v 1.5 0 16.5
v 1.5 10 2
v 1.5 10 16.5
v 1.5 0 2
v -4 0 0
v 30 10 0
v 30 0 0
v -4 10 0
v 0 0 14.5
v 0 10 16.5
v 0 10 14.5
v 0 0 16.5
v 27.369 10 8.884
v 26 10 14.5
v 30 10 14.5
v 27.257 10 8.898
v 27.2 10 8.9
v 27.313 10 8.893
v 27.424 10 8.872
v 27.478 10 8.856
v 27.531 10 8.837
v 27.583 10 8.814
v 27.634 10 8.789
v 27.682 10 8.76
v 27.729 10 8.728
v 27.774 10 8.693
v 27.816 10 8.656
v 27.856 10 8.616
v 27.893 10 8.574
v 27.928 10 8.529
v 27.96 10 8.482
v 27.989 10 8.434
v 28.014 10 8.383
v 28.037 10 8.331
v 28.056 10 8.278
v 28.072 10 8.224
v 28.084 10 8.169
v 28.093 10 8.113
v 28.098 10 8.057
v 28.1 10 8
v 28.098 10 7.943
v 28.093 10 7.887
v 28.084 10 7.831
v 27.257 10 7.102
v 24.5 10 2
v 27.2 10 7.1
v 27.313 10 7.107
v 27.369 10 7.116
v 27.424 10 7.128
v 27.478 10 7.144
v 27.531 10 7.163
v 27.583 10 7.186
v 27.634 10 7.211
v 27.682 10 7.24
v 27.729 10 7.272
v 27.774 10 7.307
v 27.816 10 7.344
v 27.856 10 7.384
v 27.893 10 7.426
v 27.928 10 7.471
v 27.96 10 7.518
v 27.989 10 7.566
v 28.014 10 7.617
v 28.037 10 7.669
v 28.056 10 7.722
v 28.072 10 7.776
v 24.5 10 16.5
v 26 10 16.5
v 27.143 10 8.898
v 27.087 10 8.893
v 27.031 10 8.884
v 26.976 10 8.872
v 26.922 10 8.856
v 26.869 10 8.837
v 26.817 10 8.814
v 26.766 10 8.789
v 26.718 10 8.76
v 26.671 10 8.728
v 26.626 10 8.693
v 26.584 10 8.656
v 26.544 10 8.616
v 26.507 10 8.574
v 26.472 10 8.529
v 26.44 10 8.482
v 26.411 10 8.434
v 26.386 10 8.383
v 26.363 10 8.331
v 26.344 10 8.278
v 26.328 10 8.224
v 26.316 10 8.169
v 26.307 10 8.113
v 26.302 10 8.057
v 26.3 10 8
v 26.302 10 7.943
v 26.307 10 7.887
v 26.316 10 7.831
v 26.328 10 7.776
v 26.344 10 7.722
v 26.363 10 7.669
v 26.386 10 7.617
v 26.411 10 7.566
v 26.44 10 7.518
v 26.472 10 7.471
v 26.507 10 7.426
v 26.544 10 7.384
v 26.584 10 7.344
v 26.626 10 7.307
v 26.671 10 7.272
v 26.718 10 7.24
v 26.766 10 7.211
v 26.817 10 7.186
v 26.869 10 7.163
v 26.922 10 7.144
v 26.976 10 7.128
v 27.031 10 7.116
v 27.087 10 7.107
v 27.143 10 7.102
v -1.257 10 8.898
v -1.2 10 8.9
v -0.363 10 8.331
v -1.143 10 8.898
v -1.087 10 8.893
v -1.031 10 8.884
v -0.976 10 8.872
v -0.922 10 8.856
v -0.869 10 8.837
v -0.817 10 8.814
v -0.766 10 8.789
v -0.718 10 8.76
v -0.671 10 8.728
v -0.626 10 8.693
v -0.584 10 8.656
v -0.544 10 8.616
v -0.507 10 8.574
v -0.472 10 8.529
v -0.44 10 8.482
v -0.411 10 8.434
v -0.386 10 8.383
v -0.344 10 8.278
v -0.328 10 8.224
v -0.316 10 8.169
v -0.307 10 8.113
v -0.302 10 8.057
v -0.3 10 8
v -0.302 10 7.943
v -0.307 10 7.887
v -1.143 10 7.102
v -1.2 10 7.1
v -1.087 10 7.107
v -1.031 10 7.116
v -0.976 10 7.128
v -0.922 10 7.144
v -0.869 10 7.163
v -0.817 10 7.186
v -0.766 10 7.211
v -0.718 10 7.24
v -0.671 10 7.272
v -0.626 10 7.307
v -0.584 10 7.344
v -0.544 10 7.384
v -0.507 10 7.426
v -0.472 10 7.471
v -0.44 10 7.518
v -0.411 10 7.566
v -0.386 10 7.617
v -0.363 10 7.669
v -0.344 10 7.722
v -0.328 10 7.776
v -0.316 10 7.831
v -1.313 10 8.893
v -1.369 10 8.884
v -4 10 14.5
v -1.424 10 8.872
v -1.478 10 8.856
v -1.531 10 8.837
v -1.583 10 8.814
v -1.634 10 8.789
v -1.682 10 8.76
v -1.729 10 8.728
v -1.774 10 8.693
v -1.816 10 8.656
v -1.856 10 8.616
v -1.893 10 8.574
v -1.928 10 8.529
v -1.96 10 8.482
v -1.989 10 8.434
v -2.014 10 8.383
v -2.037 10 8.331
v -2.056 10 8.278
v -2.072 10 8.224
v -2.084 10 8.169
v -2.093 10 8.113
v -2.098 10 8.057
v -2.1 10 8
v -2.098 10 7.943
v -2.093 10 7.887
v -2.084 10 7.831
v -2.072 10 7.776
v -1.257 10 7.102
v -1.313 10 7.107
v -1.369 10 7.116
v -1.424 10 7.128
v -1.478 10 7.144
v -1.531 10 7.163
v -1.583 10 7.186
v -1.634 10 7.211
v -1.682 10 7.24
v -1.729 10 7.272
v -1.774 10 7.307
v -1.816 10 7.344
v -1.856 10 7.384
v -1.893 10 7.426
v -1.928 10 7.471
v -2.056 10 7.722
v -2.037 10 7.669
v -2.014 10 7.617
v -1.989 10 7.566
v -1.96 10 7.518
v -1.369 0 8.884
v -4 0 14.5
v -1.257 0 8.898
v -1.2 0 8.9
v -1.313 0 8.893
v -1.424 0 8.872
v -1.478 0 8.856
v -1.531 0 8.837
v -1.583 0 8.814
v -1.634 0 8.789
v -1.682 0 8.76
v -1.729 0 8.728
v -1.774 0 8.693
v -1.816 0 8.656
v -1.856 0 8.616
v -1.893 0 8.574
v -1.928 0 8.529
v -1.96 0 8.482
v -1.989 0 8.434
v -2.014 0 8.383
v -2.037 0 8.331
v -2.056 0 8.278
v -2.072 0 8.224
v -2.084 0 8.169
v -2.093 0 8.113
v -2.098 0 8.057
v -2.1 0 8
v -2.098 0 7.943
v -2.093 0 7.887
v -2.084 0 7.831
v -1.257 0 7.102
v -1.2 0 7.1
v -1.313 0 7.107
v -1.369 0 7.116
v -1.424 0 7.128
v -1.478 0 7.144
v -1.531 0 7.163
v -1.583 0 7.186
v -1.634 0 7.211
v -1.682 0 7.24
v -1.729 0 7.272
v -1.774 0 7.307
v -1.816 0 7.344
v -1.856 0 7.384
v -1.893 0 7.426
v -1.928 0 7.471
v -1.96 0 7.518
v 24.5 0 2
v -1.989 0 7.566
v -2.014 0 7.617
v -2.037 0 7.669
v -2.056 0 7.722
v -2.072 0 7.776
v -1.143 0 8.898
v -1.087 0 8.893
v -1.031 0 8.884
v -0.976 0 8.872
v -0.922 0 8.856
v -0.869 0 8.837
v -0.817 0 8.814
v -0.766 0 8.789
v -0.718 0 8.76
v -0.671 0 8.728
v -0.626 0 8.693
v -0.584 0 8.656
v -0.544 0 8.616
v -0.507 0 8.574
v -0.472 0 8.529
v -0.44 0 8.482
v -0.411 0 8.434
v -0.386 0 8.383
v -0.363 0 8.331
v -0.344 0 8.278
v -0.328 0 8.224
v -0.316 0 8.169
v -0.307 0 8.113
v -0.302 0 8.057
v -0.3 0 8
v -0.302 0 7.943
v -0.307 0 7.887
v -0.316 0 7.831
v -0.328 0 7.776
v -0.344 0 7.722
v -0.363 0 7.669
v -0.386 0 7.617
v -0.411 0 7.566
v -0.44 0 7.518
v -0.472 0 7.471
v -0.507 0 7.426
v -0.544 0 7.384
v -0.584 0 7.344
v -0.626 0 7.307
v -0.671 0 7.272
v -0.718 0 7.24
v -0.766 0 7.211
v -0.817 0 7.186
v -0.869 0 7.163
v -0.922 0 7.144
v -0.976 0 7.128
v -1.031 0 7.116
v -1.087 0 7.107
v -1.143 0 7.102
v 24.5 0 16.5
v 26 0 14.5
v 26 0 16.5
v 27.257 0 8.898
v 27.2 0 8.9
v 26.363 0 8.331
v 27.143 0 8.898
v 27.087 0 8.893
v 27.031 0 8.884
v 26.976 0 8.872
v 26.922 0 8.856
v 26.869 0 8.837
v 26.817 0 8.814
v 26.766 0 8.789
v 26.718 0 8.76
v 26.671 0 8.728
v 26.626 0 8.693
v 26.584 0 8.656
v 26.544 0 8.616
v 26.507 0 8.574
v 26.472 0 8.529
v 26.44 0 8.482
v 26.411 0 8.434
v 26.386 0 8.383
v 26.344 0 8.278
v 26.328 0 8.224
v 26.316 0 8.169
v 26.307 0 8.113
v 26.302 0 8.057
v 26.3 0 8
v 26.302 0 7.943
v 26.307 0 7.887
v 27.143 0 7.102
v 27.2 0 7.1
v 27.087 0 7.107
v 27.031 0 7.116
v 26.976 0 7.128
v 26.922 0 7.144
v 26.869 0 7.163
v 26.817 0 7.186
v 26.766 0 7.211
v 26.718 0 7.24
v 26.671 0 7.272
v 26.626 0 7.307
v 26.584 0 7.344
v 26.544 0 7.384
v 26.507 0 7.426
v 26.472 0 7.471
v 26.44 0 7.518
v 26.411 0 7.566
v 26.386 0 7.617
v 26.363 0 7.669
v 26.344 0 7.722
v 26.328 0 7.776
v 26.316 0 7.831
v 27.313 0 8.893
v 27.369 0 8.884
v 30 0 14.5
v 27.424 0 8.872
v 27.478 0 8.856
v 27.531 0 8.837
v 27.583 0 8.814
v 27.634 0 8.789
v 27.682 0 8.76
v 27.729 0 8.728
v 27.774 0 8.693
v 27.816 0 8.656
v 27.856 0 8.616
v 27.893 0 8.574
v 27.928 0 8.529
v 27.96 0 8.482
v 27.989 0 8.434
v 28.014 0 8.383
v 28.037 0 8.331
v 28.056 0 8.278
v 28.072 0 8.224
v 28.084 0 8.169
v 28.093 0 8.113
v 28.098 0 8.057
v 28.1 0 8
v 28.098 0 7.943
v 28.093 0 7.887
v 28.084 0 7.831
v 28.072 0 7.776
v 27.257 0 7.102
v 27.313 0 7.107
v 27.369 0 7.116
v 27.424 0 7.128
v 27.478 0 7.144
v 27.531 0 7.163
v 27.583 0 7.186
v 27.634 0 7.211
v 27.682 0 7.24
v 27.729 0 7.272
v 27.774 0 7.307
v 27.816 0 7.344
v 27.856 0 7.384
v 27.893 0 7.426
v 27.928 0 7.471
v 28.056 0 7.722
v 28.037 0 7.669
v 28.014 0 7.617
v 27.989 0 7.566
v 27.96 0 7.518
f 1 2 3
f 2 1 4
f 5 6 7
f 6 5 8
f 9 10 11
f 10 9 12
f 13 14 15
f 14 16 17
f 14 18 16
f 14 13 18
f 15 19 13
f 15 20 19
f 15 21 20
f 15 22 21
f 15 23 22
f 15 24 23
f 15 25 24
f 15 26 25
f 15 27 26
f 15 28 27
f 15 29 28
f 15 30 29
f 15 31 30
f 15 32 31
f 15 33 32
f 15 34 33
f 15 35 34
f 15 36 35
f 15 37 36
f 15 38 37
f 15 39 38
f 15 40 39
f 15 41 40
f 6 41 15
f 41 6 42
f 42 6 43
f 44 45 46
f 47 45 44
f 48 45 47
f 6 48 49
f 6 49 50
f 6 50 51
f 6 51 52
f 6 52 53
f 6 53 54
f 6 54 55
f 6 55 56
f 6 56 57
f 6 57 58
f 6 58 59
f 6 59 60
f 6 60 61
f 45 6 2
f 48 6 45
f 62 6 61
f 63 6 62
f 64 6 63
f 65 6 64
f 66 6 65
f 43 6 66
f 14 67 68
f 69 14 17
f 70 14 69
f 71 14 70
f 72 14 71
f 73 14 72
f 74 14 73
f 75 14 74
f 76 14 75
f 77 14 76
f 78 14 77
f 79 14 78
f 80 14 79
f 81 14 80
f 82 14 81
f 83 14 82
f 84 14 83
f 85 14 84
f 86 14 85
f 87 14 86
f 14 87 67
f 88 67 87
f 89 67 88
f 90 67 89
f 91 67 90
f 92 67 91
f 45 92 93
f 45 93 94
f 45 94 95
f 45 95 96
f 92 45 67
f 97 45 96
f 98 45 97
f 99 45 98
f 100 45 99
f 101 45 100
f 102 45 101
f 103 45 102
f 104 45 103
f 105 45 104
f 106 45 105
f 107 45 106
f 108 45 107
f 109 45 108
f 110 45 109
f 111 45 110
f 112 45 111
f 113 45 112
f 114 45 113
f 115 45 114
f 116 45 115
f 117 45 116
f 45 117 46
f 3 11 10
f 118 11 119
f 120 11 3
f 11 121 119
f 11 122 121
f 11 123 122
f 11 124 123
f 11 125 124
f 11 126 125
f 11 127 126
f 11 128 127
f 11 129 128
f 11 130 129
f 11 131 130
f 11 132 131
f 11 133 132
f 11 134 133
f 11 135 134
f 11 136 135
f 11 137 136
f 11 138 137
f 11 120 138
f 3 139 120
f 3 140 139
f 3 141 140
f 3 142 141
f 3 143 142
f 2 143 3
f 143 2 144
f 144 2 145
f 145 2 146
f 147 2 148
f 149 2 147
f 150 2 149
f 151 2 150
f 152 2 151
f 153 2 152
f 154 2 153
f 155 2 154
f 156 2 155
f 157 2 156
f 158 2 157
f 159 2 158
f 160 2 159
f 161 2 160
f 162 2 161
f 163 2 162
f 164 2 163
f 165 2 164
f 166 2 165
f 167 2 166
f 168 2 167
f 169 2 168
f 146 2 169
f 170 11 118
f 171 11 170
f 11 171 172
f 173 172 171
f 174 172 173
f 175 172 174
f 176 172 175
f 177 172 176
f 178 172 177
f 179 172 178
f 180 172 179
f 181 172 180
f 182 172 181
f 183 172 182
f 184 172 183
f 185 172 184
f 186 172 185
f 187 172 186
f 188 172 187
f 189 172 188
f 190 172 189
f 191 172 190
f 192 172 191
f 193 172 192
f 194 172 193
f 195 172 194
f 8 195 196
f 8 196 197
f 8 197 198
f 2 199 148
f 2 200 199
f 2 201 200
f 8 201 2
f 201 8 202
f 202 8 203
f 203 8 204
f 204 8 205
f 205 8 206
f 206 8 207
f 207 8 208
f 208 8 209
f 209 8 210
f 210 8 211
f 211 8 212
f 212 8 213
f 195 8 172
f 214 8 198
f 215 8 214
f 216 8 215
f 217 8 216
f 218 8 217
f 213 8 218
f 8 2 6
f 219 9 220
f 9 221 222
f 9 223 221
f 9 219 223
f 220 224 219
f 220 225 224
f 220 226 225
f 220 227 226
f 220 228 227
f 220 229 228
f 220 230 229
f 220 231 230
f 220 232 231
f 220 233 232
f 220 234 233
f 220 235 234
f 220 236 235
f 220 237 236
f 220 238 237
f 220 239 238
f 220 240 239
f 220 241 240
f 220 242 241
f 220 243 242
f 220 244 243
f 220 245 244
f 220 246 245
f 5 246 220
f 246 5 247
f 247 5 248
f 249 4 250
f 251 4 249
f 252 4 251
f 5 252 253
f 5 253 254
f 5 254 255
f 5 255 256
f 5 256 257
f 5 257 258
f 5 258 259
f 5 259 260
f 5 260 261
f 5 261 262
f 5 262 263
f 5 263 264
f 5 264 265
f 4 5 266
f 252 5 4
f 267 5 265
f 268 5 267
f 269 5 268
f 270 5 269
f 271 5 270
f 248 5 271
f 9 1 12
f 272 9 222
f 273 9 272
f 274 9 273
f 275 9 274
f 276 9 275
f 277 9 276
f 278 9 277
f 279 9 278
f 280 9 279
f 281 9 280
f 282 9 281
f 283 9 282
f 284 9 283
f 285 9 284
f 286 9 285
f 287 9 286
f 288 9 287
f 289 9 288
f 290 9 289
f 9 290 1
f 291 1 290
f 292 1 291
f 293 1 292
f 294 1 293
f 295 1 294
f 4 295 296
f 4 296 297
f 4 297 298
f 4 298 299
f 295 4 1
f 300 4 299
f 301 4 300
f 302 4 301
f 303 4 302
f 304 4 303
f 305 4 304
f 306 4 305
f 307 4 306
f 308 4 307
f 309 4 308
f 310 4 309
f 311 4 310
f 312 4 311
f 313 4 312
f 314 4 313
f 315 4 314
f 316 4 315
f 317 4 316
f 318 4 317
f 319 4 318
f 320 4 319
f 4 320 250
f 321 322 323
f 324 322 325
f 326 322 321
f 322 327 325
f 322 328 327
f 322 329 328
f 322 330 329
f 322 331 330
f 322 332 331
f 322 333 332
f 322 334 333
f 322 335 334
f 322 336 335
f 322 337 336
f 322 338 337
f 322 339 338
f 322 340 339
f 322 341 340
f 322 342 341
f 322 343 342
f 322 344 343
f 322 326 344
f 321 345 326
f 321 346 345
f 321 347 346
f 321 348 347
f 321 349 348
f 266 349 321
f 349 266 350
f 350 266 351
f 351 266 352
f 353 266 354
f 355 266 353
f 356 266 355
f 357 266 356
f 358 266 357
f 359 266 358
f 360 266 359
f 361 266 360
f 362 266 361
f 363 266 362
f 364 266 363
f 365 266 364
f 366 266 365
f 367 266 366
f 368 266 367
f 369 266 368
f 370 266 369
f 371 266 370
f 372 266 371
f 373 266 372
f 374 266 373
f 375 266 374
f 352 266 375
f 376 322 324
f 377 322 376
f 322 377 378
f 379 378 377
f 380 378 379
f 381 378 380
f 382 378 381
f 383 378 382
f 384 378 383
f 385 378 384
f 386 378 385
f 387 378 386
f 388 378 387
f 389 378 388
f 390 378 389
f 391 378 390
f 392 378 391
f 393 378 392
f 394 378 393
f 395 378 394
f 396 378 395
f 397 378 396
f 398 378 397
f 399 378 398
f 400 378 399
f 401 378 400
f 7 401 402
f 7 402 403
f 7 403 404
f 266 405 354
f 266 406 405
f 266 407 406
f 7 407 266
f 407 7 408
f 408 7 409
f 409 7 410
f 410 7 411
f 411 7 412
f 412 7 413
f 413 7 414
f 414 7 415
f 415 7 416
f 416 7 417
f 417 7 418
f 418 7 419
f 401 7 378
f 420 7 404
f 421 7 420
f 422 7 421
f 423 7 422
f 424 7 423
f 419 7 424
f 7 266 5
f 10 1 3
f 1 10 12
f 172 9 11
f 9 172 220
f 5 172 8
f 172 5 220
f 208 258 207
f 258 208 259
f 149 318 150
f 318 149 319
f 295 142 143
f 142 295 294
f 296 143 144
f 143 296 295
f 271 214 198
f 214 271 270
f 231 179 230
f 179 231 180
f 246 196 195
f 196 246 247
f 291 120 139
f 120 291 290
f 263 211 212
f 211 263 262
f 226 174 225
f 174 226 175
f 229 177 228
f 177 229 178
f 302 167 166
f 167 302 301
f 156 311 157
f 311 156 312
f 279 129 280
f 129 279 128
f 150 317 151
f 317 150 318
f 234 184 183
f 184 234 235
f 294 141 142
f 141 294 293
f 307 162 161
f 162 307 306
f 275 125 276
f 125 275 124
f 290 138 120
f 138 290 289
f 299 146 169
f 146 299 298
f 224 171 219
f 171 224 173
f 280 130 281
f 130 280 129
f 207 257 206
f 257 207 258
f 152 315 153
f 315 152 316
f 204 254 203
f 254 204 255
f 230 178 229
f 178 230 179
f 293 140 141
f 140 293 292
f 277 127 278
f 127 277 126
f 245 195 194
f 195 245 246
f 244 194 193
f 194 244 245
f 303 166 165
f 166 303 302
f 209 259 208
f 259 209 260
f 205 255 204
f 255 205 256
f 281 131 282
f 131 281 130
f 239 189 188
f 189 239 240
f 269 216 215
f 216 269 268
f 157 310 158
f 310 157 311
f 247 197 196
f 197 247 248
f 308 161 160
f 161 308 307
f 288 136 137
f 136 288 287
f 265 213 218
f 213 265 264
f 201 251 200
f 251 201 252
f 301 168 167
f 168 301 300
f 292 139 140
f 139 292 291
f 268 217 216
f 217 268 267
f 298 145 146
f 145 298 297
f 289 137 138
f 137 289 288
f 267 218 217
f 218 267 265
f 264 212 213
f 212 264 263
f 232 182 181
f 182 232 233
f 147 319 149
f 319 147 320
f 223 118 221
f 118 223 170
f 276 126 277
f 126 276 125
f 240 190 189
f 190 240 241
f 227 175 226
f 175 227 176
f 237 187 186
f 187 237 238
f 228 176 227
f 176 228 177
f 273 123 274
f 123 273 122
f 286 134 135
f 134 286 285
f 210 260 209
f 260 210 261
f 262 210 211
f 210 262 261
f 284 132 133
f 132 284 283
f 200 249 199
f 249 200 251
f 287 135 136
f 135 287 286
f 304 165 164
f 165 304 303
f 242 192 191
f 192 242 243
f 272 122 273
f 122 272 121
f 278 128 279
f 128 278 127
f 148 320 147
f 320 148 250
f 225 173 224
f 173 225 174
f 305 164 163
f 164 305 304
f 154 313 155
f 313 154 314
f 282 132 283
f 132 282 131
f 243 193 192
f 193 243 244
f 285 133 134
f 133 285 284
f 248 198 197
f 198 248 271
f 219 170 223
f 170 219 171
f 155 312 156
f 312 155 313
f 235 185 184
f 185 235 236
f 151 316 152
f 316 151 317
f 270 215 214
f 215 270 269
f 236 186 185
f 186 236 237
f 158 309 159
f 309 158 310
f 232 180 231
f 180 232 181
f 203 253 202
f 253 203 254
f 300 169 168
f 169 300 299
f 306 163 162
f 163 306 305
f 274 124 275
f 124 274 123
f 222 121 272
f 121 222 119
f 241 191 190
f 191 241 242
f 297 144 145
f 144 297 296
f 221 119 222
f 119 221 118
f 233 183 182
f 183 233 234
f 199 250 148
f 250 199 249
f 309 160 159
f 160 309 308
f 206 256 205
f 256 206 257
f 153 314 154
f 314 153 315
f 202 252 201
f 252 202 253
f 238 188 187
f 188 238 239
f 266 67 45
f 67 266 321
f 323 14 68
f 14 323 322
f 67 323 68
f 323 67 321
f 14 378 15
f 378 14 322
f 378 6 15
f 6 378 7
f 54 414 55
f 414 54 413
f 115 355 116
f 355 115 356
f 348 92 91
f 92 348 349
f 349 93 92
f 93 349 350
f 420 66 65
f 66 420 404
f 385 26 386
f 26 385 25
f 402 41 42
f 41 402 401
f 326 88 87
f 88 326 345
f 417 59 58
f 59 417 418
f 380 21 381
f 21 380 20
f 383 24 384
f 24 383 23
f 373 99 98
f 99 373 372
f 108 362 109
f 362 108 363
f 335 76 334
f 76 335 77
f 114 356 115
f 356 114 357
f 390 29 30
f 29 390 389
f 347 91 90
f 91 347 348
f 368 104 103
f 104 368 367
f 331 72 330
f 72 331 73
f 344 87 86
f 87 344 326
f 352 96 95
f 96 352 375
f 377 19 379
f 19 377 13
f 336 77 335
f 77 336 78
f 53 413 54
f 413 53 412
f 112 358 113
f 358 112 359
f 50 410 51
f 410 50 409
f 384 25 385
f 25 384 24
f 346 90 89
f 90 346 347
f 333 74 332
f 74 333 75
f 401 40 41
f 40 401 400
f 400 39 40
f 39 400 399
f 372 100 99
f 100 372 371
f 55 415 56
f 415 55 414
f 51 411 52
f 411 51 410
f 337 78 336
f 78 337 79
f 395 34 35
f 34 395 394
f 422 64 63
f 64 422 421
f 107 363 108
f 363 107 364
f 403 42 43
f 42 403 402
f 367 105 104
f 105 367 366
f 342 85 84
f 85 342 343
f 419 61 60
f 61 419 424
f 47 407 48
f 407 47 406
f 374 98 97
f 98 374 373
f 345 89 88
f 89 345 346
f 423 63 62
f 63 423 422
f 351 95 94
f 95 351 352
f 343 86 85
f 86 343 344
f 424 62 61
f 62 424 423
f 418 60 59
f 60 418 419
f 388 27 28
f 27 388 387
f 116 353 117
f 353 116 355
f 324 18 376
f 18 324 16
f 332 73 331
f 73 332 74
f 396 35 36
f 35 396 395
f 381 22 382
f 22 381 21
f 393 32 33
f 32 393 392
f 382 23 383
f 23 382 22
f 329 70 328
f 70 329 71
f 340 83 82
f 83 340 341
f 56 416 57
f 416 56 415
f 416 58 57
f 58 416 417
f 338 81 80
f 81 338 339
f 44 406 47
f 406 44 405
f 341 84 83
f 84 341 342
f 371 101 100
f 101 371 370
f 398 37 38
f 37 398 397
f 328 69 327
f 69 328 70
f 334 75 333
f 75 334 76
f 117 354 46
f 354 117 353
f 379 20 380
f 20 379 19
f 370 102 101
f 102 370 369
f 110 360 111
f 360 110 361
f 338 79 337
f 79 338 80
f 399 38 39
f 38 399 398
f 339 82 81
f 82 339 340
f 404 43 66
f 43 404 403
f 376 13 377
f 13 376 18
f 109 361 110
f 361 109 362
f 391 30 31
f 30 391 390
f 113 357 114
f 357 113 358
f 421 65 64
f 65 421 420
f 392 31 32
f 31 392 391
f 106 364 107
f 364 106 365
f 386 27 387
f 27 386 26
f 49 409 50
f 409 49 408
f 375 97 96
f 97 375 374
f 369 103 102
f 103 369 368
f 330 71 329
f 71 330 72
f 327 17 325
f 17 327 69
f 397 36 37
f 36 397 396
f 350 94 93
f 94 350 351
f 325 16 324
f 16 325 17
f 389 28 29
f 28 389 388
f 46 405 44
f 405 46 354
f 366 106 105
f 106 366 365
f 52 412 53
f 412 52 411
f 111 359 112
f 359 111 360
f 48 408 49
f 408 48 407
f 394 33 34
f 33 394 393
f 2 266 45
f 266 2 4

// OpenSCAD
/*
 * Experimental micro servo mount
 * (meant to be printable upright with the clip facing upwards).
 * All measurements are in mm. 
 * @author: Suyash Kumar <suyash@suyashkumar.com>
 */
$fn = 100;
// All measurements in mm
servo_length = 23; 

servo_holder_width = 10; 
servo_holder_height = 14.5;
servo_holder_depth = 2;

clip_width = 1.5;
clip_overhang = 0;

screw_hole_z = 8;
screw_hole_x = -1.2;

module servo_clip_handle() {
    difference() {
        union() {
            cube([clip_width, servo_holder_width, servo_holder_height]);
            translate([0, 0, servo_holder_height])cube([clip_width + clip_overhang, servo_holder_width, servo_holder_depth]);
            translate([-4, 0, 0])cube([4, servo_holder_width, servo_holder_height]);
        }
        translate([screw_hole_x, 0, screw_hole_z])rotate([90, 0, 0])cylinder(d=1.8, h=100, center=true);
    }
}

module servo_clip() {
    union() {
        cube([25, servo_holder_width, servo_holder_depth]);
        servo_clip_handle();
        translate([servo_length + 2*clip_width, 0,0])mirror([1,0,0])servo_clip_handle();
    }
}

servo_clip();
